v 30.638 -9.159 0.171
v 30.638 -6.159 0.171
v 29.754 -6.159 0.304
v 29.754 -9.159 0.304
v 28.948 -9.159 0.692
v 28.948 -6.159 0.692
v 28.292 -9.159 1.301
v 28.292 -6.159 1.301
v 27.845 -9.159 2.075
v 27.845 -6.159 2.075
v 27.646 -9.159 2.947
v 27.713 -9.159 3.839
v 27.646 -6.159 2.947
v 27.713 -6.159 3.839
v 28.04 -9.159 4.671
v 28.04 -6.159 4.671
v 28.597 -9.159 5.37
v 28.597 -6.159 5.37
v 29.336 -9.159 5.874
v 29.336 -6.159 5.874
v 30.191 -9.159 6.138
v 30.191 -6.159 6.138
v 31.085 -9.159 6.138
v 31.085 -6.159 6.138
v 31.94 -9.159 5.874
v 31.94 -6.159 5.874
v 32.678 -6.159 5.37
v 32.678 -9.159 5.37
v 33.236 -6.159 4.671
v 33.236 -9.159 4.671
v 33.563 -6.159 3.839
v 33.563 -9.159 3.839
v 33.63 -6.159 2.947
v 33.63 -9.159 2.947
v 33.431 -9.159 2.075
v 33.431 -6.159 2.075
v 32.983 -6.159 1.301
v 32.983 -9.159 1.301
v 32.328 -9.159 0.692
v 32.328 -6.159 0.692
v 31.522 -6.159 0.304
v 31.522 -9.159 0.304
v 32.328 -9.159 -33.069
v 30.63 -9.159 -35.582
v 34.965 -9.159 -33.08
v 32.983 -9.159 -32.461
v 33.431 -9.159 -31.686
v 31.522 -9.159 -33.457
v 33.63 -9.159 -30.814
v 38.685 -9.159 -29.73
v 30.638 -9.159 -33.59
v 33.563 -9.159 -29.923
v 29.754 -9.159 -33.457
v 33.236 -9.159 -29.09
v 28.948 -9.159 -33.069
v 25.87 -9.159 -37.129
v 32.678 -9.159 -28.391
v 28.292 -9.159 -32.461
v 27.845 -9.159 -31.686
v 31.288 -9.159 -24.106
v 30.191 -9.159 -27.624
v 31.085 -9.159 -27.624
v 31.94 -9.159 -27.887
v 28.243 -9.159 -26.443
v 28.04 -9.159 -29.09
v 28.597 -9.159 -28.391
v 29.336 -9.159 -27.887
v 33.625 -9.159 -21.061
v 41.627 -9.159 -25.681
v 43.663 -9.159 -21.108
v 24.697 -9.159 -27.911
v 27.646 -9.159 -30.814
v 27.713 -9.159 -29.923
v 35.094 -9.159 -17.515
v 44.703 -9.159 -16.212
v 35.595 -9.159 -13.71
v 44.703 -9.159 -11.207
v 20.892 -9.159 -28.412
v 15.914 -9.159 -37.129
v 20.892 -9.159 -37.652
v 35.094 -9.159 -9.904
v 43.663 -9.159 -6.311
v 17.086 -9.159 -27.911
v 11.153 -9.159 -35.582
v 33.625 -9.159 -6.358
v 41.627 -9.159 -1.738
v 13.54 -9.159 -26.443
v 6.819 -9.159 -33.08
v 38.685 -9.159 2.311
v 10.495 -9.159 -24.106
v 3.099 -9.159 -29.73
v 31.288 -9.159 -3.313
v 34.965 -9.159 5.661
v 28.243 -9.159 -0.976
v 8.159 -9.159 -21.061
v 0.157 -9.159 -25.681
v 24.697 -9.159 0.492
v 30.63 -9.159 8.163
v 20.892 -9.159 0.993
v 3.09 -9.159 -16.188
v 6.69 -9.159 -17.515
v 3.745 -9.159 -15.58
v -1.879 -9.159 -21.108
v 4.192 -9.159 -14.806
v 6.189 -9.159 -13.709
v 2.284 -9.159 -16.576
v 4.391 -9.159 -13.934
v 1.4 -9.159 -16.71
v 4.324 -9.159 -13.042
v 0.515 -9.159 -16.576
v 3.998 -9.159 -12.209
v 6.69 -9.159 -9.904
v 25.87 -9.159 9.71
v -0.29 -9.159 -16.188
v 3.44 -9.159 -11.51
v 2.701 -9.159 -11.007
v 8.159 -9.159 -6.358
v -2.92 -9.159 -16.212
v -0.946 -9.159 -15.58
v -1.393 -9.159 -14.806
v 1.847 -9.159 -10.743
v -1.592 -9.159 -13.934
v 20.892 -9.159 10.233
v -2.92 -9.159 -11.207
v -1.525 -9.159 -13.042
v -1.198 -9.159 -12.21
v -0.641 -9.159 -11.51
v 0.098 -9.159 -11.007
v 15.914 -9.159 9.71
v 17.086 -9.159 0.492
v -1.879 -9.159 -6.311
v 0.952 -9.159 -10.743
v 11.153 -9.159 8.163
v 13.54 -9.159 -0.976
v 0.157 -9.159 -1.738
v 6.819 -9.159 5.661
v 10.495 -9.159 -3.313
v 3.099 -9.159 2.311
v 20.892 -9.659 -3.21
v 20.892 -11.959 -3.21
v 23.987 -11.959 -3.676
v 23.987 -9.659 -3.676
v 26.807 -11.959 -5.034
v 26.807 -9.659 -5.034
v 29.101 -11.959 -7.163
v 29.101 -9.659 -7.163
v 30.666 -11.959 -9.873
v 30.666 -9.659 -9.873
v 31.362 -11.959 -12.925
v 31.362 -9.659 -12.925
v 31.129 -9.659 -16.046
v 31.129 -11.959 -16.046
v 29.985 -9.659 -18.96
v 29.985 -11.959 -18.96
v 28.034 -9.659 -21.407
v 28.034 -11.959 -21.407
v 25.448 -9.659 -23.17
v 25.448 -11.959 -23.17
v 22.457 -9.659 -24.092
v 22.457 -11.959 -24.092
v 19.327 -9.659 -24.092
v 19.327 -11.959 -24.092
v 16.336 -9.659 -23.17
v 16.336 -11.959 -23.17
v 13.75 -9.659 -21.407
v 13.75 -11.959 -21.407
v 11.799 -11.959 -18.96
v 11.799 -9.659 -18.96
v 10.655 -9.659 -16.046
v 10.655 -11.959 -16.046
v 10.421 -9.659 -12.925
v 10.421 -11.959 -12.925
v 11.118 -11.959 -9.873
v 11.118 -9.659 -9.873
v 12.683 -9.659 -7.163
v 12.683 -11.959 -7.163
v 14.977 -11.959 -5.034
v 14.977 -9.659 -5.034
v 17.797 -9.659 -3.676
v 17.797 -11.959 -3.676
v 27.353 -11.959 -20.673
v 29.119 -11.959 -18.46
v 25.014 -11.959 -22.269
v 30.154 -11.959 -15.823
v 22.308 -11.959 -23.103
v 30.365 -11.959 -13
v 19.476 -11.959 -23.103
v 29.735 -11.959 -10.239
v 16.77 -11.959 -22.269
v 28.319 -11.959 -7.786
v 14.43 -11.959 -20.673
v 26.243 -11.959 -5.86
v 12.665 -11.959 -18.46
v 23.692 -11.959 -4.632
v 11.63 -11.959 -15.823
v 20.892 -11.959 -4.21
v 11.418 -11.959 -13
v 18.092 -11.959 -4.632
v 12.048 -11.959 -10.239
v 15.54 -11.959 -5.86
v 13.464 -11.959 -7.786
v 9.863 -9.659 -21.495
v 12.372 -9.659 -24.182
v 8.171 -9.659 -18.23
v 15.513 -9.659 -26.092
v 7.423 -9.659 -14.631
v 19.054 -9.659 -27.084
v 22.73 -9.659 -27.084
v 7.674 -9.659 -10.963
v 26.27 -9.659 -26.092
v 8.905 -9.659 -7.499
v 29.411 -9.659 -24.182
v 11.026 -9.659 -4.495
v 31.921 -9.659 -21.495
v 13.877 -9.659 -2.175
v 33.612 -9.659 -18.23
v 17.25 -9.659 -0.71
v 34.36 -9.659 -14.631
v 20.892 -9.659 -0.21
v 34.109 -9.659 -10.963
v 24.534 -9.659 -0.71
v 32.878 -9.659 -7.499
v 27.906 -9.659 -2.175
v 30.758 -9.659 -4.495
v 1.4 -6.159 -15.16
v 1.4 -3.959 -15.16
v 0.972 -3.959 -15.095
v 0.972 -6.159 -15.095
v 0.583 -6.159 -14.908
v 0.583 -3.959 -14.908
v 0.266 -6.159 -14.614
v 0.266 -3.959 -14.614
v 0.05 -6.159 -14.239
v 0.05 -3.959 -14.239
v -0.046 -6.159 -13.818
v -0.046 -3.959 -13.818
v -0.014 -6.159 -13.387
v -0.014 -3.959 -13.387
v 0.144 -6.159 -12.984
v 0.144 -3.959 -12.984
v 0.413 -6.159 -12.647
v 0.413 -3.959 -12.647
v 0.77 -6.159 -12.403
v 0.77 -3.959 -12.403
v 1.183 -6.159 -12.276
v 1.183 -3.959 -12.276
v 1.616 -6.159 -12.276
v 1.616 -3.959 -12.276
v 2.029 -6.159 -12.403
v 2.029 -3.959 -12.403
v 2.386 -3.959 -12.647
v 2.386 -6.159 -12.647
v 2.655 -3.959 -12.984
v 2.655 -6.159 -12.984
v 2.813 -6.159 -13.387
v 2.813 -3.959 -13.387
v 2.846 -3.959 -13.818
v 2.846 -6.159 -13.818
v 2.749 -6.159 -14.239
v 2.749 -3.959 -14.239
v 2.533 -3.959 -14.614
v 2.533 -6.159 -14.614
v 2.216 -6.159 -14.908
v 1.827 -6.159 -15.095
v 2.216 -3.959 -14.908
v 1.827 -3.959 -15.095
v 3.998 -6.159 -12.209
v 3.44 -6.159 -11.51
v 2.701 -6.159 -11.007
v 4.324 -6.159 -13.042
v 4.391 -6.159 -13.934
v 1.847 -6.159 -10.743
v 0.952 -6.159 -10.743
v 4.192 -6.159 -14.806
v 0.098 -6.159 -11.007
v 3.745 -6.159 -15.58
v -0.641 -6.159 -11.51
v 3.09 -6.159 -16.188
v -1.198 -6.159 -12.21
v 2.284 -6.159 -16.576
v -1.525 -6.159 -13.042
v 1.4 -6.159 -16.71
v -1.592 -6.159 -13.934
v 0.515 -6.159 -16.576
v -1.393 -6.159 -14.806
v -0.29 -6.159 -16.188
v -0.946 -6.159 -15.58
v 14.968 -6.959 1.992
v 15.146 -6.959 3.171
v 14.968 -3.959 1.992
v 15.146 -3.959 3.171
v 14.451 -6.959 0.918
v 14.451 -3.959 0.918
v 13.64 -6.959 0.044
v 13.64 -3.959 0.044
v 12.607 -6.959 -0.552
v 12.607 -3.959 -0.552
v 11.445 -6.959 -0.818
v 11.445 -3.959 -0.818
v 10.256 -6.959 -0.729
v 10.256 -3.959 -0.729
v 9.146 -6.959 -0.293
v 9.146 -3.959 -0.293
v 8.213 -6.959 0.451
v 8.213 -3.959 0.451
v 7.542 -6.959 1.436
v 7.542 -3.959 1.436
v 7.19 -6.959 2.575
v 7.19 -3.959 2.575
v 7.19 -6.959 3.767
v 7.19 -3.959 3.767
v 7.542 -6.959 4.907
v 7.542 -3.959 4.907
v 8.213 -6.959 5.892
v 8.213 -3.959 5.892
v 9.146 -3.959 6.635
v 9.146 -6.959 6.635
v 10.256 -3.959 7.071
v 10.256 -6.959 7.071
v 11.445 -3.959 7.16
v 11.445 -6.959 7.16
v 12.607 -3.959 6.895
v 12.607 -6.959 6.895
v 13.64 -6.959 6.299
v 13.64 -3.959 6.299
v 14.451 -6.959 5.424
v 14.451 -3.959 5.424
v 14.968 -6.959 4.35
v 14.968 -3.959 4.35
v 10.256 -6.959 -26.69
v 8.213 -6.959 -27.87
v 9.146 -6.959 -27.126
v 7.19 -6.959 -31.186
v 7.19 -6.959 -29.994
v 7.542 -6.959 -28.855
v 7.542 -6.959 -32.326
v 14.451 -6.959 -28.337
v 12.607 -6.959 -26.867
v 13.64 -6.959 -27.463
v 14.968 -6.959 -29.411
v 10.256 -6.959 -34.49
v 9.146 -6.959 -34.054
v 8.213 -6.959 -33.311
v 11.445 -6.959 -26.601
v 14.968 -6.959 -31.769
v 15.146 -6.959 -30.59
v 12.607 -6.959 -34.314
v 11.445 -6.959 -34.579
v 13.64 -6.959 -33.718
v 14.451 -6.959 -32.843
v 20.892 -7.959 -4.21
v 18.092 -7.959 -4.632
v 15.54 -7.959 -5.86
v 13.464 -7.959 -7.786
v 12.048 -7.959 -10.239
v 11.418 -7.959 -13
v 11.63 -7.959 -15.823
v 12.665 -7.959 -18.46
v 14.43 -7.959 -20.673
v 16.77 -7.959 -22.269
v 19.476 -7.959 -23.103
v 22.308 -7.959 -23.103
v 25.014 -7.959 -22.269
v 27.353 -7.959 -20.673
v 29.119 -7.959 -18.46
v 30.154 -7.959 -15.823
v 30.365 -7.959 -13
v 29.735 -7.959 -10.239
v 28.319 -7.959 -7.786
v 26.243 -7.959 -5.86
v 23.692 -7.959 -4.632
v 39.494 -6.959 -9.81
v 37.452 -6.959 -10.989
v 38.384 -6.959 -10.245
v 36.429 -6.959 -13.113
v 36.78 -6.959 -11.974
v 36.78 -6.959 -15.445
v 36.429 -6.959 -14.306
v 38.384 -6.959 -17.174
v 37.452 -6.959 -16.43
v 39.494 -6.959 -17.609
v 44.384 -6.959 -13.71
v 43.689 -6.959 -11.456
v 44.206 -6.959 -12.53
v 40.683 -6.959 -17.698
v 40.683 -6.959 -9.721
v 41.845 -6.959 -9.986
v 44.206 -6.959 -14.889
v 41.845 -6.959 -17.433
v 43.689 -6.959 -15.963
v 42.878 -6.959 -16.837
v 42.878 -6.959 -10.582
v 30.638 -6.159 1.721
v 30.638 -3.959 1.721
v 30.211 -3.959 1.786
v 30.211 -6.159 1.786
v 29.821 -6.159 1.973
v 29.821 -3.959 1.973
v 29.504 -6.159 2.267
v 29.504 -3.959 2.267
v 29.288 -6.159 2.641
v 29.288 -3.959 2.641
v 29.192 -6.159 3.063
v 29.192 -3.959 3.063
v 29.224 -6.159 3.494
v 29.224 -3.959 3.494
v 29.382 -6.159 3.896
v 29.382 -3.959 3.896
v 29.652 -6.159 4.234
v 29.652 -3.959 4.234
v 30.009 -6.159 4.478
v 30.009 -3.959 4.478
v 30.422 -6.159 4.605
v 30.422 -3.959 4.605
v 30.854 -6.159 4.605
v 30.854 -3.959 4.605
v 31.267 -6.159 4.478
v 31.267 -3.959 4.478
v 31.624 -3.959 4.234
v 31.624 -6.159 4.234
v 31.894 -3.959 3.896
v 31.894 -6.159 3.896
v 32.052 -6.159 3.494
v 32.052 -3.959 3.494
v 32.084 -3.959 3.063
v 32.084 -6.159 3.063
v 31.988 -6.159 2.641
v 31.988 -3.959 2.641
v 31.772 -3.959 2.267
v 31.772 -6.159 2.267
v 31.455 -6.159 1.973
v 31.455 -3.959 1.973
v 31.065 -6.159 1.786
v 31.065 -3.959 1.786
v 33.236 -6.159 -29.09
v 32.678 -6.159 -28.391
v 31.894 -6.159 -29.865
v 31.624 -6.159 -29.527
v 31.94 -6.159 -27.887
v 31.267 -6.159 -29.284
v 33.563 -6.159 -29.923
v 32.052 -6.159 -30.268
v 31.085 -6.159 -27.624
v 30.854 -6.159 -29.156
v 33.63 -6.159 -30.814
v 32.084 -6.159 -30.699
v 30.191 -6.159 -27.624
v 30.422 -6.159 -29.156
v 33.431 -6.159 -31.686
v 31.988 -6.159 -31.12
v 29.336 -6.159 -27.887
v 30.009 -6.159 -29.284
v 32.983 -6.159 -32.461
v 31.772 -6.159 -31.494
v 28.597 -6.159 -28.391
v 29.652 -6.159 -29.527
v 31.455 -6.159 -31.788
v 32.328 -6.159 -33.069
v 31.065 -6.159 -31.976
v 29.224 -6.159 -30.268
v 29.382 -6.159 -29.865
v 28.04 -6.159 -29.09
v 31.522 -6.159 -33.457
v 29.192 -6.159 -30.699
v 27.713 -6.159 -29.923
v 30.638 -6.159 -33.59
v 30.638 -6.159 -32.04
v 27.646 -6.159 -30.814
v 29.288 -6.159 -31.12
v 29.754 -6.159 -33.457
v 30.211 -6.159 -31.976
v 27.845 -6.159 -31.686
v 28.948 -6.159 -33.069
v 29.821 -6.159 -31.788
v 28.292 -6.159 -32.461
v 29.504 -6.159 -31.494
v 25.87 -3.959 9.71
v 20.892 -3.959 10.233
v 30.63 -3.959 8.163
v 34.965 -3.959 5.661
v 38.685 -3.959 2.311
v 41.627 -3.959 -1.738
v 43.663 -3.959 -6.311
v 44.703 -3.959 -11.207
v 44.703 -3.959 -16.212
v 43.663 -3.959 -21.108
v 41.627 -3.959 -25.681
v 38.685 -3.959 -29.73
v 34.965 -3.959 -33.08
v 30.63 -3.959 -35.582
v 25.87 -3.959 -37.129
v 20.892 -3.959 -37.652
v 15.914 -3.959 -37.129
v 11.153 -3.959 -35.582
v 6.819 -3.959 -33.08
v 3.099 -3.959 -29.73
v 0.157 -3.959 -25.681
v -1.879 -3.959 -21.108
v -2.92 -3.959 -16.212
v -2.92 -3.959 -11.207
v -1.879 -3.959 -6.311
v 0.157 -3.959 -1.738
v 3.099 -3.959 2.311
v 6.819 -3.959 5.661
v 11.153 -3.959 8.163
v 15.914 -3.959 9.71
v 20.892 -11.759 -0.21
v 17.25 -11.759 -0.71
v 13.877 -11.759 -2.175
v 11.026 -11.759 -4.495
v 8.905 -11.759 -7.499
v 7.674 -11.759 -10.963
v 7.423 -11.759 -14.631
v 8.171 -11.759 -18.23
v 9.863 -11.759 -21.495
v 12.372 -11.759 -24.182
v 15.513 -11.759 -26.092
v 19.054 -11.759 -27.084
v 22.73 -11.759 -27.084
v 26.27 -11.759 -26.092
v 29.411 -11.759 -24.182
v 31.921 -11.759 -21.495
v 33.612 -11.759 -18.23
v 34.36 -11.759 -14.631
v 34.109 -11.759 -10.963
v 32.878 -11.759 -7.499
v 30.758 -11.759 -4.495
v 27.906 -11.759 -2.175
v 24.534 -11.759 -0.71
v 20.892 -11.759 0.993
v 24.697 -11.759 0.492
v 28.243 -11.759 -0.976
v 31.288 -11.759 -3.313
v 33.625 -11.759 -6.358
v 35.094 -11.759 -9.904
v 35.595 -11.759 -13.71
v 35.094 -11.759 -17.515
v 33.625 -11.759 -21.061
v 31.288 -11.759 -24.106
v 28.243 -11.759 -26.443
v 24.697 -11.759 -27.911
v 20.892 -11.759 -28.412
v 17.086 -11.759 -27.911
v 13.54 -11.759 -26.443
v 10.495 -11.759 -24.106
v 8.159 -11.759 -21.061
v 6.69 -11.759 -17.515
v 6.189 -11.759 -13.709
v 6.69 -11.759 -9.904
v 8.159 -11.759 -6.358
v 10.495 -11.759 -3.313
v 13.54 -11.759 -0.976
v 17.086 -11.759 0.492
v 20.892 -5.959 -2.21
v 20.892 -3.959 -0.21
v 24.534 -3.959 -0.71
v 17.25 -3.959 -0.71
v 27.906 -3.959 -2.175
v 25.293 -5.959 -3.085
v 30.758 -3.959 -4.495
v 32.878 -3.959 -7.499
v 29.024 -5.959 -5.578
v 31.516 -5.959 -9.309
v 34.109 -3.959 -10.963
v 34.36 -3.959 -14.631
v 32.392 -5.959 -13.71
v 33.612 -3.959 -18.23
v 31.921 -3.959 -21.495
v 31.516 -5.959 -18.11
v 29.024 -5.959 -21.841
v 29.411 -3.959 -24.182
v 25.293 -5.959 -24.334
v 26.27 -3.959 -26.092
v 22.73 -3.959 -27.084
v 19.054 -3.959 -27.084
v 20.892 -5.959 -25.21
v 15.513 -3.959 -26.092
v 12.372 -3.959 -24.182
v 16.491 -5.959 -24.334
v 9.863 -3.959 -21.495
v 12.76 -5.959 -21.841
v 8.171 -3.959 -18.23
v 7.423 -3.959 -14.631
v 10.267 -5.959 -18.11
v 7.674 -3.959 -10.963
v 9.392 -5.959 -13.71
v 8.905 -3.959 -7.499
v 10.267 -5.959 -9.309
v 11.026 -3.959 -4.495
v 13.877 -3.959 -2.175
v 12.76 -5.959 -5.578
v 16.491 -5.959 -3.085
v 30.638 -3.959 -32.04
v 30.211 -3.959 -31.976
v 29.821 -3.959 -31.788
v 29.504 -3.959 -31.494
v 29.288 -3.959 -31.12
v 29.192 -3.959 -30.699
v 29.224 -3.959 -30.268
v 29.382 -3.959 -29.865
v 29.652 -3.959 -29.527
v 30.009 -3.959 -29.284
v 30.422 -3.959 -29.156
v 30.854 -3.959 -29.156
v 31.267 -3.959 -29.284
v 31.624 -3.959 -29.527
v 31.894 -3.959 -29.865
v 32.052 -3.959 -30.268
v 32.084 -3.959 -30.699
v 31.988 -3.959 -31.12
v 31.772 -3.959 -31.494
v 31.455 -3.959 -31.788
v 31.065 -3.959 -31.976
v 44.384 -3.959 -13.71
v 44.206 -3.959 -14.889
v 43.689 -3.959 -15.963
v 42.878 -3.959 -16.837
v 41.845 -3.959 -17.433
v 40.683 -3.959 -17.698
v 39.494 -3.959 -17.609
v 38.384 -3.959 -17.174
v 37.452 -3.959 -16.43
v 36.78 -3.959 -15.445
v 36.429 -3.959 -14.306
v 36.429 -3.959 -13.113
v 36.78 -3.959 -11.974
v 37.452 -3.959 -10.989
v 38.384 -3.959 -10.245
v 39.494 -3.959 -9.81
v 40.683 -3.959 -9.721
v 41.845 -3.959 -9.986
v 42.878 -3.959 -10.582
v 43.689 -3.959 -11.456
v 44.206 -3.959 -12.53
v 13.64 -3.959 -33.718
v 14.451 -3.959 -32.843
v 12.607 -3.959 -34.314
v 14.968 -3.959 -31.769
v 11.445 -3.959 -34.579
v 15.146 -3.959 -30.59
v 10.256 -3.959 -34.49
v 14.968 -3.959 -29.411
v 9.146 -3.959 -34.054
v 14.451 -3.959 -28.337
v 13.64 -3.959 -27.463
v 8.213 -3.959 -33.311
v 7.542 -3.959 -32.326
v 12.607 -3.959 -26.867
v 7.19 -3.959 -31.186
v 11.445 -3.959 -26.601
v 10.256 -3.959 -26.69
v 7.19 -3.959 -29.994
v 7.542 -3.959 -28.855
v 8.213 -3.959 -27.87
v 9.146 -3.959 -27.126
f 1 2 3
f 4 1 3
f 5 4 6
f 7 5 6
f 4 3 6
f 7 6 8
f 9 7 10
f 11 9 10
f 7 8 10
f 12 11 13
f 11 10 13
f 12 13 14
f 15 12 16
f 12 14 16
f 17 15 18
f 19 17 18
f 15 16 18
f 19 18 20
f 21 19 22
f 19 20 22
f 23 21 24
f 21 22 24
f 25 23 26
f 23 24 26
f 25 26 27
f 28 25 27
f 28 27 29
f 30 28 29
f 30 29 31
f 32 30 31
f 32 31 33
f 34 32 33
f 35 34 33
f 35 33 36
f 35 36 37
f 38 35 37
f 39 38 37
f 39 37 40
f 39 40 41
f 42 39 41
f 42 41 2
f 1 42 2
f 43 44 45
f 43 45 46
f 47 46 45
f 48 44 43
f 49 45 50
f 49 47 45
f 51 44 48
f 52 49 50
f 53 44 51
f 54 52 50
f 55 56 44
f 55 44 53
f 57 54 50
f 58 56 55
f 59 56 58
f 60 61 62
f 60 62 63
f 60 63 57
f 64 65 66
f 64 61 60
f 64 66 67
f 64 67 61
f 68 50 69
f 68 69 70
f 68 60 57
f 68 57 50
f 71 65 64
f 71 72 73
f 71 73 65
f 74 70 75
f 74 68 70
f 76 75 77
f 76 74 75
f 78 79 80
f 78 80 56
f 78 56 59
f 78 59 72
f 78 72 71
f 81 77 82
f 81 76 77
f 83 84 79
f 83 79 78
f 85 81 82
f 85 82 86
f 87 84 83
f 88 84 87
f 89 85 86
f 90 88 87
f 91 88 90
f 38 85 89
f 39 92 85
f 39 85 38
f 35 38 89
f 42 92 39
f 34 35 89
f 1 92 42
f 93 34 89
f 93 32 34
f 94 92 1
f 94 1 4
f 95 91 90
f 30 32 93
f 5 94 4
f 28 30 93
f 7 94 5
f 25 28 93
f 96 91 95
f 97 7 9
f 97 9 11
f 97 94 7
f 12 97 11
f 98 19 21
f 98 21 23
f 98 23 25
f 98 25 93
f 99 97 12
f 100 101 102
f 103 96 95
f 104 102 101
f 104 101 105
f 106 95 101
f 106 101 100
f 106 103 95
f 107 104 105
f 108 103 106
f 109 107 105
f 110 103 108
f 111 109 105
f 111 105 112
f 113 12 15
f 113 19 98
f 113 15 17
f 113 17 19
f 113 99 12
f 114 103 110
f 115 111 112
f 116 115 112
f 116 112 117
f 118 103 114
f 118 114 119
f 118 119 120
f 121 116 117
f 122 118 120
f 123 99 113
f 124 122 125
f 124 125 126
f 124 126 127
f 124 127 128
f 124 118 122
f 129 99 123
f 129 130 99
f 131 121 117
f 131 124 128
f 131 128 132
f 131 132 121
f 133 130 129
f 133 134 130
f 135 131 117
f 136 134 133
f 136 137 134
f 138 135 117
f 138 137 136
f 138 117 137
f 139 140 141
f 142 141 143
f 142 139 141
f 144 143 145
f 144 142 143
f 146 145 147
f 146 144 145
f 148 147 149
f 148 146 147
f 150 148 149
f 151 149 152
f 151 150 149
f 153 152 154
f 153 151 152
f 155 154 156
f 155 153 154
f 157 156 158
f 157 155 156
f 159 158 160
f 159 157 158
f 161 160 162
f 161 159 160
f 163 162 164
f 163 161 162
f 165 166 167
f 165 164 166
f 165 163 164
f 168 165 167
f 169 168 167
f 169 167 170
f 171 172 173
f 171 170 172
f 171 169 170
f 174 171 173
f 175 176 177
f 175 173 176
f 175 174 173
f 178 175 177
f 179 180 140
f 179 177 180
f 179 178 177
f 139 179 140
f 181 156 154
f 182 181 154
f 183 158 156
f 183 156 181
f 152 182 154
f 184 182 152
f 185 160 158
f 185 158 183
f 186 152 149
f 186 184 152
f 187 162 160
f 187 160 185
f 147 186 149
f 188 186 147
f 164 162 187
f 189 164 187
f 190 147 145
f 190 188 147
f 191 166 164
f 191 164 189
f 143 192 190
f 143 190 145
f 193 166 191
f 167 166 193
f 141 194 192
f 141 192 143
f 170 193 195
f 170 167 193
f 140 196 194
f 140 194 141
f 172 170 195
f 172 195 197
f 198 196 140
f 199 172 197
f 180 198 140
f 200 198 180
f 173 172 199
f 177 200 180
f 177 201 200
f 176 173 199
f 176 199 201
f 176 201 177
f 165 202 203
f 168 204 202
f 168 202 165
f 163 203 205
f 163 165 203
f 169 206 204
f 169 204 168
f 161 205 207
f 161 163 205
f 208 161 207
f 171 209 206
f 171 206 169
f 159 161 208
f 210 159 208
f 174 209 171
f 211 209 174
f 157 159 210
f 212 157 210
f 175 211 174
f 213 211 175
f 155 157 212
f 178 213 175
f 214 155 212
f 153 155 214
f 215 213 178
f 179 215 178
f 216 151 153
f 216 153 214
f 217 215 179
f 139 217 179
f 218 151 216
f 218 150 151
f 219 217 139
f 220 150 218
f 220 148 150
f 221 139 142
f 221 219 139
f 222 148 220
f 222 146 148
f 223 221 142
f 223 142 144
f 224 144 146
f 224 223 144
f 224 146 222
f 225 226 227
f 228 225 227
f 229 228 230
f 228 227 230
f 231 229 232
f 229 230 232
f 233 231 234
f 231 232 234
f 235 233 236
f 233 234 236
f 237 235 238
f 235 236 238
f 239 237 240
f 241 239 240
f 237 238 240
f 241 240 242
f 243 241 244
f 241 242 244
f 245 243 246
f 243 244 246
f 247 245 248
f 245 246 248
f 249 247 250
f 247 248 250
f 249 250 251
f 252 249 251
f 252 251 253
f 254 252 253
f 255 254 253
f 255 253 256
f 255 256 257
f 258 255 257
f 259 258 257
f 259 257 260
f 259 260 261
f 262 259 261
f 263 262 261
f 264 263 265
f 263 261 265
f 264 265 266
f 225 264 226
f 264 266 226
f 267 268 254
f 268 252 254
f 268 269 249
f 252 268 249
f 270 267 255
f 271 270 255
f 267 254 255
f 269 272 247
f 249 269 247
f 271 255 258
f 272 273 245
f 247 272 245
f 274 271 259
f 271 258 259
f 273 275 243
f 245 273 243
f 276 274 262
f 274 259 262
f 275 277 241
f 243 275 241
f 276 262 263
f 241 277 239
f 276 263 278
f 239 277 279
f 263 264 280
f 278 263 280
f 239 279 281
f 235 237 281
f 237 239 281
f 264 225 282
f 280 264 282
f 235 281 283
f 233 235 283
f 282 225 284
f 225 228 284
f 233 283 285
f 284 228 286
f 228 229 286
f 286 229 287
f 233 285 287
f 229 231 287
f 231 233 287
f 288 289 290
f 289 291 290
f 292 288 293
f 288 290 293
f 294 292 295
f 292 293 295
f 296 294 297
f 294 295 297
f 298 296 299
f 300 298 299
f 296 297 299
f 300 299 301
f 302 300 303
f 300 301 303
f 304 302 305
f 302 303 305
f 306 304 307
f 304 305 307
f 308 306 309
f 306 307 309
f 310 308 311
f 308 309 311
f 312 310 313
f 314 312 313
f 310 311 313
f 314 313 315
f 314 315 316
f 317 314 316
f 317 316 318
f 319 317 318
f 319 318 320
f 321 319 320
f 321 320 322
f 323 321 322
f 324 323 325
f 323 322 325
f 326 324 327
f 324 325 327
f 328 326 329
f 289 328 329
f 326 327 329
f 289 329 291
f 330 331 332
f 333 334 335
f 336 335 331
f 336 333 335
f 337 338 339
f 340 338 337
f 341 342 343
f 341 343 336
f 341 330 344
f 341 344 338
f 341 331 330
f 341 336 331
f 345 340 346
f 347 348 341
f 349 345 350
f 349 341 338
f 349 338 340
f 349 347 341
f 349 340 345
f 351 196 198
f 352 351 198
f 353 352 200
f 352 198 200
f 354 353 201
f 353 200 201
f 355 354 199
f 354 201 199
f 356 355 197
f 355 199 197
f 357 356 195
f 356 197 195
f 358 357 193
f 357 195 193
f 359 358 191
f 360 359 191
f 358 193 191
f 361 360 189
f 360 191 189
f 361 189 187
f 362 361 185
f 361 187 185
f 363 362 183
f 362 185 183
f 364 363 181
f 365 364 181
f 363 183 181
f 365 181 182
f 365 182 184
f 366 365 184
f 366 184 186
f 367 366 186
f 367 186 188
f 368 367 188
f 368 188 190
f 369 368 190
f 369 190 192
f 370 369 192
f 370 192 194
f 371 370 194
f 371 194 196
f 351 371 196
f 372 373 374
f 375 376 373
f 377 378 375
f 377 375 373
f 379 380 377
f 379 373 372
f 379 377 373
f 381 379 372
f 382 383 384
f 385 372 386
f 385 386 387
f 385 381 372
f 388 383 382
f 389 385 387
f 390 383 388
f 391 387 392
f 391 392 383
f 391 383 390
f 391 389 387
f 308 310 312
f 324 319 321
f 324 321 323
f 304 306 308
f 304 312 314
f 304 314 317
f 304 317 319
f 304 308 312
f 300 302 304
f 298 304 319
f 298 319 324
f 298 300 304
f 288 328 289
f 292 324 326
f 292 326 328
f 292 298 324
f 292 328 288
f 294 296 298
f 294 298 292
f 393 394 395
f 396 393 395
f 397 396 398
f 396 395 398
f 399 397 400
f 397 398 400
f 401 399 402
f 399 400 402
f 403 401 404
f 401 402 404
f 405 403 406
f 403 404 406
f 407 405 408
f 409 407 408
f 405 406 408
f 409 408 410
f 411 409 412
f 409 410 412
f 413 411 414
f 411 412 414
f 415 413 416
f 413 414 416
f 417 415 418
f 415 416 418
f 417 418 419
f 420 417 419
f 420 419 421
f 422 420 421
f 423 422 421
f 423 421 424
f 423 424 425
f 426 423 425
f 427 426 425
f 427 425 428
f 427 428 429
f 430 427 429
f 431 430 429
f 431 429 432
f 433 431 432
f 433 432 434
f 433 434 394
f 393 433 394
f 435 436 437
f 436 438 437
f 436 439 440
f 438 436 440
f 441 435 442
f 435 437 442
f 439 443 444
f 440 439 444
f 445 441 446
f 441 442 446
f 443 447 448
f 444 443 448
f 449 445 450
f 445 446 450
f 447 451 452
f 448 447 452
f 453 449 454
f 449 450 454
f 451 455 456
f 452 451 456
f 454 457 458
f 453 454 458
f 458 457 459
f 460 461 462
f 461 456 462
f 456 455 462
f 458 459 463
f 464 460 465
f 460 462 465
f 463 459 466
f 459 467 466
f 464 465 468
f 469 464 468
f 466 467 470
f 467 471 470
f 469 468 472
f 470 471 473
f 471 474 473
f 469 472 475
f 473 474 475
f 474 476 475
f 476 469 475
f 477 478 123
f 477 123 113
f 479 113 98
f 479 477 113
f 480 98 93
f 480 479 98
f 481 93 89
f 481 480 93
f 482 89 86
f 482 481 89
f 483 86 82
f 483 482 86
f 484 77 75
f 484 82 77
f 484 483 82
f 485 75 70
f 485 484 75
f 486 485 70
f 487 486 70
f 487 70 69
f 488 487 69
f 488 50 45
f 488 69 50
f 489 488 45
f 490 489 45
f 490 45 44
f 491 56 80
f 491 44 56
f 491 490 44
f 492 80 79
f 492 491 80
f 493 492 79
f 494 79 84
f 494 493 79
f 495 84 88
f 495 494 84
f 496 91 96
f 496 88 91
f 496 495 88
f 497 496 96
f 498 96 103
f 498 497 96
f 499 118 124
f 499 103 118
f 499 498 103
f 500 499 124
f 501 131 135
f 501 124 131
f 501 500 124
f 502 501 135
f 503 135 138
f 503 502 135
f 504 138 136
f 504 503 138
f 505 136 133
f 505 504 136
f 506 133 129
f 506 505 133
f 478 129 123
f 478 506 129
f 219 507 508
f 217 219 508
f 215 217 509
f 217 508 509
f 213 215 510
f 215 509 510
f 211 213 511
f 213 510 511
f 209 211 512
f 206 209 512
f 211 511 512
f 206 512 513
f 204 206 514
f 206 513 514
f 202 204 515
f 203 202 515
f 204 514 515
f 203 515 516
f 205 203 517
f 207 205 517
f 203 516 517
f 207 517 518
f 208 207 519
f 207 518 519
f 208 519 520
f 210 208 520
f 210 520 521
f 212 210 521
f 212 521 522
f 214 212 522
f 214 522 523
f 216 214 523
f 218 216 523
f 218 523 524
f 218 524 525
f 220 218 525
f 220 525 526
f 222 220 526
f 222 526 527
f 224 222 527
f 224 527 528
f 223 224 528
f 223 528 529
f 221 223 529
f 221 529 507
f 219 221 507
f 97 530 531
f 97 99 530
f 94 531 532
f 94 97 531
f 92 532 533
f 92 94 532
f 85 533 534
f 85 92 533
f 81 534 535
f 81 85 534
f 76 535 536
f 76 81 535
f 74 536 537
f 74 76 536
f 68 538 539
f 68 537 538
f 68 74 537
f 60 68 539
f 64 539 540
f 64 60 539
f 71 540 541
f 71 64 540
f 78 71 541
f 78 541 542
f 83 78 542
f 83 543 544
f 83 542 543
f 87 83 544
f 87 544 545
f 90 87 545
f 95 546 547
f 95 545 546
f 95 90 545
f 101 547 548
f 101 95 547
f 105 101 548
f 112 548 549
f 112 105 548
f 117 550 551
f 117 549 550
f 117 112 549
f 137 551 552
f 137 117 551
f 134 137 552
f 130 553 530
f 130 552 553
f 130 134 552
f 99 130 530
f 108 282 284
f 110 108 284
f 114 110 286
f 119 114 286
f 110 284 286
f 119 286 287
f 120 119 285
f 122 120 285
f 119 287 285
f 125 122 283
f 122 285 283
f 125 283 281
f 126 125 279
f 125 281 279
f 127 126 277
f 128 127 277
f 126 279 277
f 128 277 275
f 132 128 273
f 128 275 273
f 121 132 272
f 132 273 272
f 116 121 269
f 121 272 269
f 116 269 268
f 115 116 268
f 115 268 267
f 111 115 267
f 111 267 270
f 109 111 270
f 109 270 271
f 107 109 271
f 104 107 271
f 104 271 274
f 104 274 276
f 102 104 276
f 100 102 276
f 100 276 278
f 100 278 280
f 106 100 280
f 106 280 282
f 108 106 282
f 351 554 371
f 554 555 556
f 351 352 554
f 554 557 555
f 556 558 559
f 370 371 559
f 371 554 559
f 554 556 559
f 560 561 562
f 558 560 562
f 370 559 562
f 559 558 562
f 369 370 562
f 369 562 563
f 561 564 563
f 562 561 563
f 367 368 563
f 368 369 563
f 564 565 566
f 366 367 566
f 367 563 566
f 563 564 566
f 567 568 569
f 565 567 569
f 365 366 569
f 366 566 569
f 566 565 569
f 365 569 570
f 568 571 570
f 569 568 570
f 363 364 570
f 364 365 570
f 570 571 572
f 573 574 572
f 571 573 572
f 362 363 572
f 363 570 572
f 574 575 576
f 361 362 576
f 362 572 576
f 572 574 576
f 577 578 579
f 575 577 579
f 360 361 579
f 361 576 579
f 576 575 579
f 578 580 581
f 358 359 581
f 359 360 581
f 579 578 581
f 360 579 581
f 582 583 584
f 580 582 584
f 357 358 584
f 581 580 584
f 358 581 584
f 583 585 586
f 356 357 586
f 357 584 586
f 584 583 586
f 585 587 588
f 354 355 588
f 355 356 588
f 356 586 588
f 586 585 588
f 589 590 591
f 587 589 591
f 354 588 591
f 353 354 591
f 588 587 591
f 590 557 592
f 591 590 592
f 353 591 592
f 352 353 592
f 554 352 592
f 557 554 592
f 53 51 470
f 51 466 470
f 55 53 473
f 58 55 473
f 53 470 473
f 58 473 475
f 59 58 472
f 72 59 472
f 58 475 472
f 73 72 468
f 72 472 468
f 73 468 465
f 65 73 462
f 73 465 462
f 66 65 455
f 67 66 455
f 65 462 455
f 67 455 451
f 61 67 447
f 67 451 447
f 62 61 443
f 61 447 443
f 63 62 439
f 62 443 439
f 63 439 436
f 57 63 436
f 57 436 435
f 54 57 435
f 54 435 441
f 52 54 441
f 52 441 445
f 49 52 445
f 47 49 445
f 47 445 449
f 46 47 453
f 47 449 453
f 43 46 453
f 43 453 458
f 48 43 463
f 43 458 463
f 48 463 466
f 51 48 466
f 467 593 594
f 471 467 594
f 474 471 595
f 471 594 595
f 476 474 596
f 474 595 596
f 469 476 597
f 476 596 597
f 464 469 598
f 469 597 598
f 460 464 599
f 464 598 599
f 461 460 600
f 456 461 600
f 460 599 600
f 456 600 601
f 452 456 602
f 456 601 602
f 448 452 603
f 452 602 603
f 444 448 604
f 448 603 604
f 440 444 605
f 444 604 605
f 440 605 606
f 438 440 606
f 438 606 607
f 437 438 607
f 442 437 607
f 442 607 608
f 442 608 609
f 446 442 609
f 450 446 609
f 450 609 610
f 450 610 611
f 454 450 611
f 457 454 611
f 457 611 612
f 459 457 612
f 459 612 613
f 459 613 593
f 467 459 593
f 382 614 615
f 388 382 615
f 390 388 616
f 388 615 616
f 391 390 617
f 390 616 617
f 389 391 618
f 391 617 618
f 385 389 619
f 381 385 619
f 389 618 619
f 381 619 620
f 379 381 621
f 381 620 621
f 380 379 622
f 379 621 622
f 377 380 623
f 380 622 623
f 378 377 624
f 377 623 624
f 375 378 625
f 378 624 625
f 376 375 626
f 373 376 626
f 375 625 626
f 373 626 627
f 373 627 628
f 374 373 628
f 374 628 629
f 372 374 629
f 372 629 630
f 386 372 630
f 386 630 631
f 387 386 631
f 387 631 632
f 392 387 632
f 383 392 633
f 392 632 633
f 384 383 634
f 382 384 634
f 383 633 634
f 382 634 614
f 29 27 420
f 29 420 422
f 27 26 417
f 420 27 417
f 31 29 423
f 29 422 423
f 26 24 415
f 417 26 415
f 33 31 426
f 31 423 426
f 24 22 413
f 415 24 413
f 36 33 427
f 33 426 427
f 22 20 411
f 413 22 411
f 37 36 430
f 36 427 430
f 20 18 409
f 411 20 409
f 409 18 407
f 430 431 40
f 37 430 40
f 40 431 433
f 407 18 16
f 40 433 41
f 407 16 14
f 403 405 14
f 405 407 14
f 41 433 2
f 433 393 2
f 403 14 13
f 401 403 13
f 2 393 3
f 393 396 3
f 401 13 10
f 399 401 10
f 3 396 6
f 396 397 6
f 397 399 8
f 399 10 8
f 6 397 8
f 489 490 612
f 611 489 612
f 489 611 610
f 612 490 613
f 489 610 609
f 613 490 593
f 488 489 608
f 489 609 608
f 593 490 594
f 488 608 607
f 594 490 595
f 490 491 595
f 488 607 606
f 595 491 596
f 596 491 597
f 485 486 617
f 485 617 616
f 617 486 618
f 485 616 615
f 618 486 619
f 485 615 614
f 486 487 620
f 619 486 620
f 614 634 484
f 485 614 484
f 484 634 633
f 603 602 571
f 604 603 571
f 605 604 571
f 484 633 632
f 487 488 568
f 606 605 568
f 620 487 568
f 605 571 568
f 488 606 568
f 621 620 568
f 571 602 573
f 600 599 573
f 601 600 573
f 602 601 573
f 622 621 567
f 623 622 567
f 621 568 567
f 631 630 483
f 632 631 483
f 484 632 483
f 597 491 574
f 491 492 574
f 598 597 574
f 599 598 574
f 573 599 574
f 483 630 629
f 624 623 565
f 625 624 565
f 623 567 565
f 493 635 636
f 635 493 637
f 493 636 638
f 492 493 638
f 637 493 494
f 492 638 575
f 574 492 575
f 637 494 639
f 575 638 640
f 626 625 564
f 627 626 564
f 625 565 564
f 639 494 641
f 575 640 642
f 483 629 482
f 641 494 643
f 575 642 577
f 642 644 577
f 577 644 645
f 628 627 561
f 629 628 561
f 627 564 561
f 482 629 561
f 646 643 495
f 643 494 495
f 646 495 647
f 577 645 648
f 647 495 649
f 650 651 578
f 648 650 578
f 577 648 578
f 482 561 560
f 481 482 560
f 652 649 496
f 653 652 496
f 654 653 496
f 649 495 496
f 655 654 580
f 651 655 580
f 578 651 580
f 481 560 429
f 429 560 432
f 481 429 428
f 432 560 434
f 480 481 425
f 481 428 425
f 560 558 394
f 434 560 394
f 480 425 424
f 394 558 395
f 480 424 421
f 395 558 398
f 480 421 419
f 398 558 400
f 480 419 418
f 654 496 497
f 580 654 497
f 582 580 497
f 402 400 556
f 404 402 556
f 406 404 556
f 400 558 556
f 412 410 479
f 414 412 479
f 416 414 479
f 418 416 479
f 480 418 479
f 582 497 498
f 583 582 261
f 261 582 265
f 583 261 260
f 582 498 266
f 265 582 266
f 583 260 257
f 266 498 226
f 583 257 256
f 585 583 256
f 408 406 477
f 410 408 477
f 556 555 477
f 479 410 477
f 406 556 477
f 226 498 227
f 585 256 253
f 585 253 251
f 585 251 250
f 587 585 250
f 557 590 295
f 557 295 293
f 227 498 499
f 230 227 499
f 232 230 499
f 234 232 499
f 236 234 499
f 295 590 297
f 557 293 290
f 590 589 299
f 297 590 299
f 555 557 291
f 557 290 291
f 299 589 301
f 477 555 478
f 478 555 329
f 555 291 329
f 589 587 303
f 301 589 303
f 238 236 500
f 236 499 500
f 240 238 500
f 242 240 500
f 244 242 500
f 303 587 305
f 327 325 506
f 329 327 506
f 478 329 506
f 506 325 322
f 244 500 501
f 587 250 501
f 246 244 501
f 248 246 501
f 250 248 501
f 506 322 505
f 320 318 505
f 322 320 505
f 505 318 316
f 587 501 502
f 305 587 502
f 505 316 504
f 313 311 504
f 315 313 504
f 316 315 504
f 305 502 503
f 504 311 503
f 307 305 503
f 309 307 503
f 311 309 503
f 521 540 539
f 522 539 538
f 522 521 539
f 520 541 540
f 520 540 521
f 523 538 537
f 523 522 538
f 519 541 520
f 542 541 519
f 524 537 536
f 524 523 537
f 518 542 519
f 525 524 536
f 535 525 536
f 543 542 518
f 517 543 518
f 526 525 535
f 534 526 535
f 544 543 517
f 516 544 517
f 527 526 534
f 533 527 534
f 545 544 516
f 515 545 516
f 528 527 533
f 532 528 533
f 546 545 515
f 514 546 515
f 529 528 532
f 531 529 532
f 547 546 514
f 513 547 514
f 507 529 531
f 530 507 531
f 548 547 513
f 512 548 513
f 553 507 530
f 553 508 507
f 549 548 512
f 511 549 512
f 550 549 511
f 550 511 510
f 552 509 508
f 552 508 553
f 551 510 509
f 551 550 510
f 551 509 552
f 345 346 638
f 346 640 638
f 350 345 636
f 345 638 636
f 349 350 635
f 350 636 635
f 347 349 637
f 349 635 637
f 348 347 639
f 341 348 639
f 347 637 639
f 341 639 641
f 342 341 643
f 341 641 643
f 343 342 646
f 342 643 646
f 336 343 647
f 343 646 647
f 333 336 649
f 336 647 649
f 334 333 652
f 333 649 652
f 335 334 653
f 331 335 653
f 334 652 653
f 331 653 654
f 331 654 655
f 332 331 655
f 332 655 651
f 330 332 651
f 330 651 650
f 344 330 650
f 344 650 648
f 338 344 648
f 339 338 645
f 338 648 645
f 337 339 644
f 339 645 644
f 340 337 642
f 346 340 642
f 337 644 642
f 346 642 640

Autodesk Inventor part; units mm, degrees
ref_plane "YZ Plane" through (0, 0, 0) normal (1, 0, 0) x (0, 1, 0)
ref_plane "XZ Plane" through (0, 0, 0) normal (0, 1, 0) x (-1, 0, 0)
ref_plane "XY Plane" through (0, 0, 0) normal (0, 0, 1) x (1, 0, 0)
ref_plane "Arbeitsebene1" through (20.8918, -10.7106, -13.7095) normal (1, 0, 0) x (0, 1, 0)
sketch "Skizze1" plane through (20.8918, -10.7106, -13.7095) normal (1, 0, 0) x (0, 1, 0)
  circle A0 centre (0.052, 12) radius 1.5 construction
  line L0 (13.1827, 0) -> (-4.1221, 0)
  line L1 (-1.248, 10.5) -> (1.552, 10.5)
  line L2 (1.552, 10.5) -> (1.552, 13.5)
  line L3 (1.552, 13.5) -> (-1.048, 13.5)
  line L4 (1.552, 23.9428) -> (6.752, 23.9428)
  line L5 (6.752, 23.9428) -> (6.752, 13.5)
  line L6 (2.752, 9.5) -> (-1.248, 9.5)
  line L7 (-1.248, 9.5) -> (-1.248, 10.5)
  line L8 (6.752, 13.5) -> (2.752, 9.5)
  line L9 (-1.048, 13.5) -> (-1.048, 14.7029)
  line L10 (1.05, -14.9922) -> (1.05, 14.9922) construction
  line L11 (-1.4, -14.9922) -> (-1.4, 14.9922) construction
  line L12 (1.05, 14.9029) -> (-1.4, 14.9029) construction
  line L13 (-1.048, 14.7029) -> (1.552, 14.7029)
  line L14 (1.552, 14.7029) -> (1.552, 23.9428)
  line L15 (-2.25, 23.9428) -> (1.15, 23.9428)
  point P0 (10.7106, 13.7095)
  point P1 (6.752, 9.5)
  point P2 (-1.048, 14.9029)
  dimension "d0" = 3
  dimension "d1" = 12
  dimension "d4" = 4
  dimension "d5" = 4
  dimension "d6" = 1
  dimension "d7" = 1.3
  dimension "d8" = 2.6
  dimension "d10" = 4
  dimension "d11" = 0.2
  dimension "d20" = 0
revolve "Umdrehung1" add sketch "Skizze1" angle 360 about axis through (20.8918, 2.4721, -13.7095) along (0, -1, 0)
sketch "Skizze2" plane through (20.8918, -9.1586, -13.7095) normal (0, -1, 0) x (1, 0, 0)
  circle A0 centre (9.7461, 16.8807) radius 4 projected
  circle A1 centre (-19.4922, 0) radius 4 projected
  circle A2 centre (9.7461, -16.8807) radius 4 projected
  point P0 (-20.8918, 13.7095)
hole "Bohrung1" at (30.6379, -9.1586, 3.1712) at (30.6379, -9.1586, -30.5903) at (1.3996, -9.1586, -13.7095) direction (0, 1, 0) diameter 2.9 depth 12 tip angle 118 counterbore diameter 6 counterbore depth 3
sketch "Skizze3" plane through (20.8918, -3.9586, -13.7095) normal (0, 1, 0) x (1, 0, 0)
  circle A0 centre (0, 0) radius 13.5 projected
  circle A1 centre (9.7461, -16.8807) radius 1.45 projected
  circle A2 centre (0, 0) radius 19.4922 construction
  line L0 (-9.7461, -16.8807) -> (-9.7461, 16.8807) construction
  line L1 (-9.7461, 16.8807) -> (19.4922, 0) construction
  line L2 (19.4922, 0) -> (-9.7461, -16.8807) construction
  circle A3 centre (-9.7461, -16.8807) radius 4
  circle A4 centre (-9.7461, 16.8807) radius 4
  circle A5 centre (19.4922, 0) radius 4
  point P0 (-20.8918, -13.7095)
  dimension "d21" = 8
  dimension "d22" = 8
  dimension "d23" = 8
extrude "Extrusion1" cut sketch "Skizze3" against normal blind 3 contours A3 | A4 | A5
sketch "Skizze4" plane through (20.8918, -9.1586, -13.7095) normal (0, -1, 0) x (1, 0, 0)
  circle A0 centre (0, 0) radius 13.5 projected
  circle A1 centre (0, 0) radius 10.5 projected
  point P0 (-20.8918, 13.7095)
extrude "Extrusion2" add sketch "Skizze4" along normal blind 0.5
equation "\"d5\" = d4"
properties part number "01_SMLM_Holder_Base"
